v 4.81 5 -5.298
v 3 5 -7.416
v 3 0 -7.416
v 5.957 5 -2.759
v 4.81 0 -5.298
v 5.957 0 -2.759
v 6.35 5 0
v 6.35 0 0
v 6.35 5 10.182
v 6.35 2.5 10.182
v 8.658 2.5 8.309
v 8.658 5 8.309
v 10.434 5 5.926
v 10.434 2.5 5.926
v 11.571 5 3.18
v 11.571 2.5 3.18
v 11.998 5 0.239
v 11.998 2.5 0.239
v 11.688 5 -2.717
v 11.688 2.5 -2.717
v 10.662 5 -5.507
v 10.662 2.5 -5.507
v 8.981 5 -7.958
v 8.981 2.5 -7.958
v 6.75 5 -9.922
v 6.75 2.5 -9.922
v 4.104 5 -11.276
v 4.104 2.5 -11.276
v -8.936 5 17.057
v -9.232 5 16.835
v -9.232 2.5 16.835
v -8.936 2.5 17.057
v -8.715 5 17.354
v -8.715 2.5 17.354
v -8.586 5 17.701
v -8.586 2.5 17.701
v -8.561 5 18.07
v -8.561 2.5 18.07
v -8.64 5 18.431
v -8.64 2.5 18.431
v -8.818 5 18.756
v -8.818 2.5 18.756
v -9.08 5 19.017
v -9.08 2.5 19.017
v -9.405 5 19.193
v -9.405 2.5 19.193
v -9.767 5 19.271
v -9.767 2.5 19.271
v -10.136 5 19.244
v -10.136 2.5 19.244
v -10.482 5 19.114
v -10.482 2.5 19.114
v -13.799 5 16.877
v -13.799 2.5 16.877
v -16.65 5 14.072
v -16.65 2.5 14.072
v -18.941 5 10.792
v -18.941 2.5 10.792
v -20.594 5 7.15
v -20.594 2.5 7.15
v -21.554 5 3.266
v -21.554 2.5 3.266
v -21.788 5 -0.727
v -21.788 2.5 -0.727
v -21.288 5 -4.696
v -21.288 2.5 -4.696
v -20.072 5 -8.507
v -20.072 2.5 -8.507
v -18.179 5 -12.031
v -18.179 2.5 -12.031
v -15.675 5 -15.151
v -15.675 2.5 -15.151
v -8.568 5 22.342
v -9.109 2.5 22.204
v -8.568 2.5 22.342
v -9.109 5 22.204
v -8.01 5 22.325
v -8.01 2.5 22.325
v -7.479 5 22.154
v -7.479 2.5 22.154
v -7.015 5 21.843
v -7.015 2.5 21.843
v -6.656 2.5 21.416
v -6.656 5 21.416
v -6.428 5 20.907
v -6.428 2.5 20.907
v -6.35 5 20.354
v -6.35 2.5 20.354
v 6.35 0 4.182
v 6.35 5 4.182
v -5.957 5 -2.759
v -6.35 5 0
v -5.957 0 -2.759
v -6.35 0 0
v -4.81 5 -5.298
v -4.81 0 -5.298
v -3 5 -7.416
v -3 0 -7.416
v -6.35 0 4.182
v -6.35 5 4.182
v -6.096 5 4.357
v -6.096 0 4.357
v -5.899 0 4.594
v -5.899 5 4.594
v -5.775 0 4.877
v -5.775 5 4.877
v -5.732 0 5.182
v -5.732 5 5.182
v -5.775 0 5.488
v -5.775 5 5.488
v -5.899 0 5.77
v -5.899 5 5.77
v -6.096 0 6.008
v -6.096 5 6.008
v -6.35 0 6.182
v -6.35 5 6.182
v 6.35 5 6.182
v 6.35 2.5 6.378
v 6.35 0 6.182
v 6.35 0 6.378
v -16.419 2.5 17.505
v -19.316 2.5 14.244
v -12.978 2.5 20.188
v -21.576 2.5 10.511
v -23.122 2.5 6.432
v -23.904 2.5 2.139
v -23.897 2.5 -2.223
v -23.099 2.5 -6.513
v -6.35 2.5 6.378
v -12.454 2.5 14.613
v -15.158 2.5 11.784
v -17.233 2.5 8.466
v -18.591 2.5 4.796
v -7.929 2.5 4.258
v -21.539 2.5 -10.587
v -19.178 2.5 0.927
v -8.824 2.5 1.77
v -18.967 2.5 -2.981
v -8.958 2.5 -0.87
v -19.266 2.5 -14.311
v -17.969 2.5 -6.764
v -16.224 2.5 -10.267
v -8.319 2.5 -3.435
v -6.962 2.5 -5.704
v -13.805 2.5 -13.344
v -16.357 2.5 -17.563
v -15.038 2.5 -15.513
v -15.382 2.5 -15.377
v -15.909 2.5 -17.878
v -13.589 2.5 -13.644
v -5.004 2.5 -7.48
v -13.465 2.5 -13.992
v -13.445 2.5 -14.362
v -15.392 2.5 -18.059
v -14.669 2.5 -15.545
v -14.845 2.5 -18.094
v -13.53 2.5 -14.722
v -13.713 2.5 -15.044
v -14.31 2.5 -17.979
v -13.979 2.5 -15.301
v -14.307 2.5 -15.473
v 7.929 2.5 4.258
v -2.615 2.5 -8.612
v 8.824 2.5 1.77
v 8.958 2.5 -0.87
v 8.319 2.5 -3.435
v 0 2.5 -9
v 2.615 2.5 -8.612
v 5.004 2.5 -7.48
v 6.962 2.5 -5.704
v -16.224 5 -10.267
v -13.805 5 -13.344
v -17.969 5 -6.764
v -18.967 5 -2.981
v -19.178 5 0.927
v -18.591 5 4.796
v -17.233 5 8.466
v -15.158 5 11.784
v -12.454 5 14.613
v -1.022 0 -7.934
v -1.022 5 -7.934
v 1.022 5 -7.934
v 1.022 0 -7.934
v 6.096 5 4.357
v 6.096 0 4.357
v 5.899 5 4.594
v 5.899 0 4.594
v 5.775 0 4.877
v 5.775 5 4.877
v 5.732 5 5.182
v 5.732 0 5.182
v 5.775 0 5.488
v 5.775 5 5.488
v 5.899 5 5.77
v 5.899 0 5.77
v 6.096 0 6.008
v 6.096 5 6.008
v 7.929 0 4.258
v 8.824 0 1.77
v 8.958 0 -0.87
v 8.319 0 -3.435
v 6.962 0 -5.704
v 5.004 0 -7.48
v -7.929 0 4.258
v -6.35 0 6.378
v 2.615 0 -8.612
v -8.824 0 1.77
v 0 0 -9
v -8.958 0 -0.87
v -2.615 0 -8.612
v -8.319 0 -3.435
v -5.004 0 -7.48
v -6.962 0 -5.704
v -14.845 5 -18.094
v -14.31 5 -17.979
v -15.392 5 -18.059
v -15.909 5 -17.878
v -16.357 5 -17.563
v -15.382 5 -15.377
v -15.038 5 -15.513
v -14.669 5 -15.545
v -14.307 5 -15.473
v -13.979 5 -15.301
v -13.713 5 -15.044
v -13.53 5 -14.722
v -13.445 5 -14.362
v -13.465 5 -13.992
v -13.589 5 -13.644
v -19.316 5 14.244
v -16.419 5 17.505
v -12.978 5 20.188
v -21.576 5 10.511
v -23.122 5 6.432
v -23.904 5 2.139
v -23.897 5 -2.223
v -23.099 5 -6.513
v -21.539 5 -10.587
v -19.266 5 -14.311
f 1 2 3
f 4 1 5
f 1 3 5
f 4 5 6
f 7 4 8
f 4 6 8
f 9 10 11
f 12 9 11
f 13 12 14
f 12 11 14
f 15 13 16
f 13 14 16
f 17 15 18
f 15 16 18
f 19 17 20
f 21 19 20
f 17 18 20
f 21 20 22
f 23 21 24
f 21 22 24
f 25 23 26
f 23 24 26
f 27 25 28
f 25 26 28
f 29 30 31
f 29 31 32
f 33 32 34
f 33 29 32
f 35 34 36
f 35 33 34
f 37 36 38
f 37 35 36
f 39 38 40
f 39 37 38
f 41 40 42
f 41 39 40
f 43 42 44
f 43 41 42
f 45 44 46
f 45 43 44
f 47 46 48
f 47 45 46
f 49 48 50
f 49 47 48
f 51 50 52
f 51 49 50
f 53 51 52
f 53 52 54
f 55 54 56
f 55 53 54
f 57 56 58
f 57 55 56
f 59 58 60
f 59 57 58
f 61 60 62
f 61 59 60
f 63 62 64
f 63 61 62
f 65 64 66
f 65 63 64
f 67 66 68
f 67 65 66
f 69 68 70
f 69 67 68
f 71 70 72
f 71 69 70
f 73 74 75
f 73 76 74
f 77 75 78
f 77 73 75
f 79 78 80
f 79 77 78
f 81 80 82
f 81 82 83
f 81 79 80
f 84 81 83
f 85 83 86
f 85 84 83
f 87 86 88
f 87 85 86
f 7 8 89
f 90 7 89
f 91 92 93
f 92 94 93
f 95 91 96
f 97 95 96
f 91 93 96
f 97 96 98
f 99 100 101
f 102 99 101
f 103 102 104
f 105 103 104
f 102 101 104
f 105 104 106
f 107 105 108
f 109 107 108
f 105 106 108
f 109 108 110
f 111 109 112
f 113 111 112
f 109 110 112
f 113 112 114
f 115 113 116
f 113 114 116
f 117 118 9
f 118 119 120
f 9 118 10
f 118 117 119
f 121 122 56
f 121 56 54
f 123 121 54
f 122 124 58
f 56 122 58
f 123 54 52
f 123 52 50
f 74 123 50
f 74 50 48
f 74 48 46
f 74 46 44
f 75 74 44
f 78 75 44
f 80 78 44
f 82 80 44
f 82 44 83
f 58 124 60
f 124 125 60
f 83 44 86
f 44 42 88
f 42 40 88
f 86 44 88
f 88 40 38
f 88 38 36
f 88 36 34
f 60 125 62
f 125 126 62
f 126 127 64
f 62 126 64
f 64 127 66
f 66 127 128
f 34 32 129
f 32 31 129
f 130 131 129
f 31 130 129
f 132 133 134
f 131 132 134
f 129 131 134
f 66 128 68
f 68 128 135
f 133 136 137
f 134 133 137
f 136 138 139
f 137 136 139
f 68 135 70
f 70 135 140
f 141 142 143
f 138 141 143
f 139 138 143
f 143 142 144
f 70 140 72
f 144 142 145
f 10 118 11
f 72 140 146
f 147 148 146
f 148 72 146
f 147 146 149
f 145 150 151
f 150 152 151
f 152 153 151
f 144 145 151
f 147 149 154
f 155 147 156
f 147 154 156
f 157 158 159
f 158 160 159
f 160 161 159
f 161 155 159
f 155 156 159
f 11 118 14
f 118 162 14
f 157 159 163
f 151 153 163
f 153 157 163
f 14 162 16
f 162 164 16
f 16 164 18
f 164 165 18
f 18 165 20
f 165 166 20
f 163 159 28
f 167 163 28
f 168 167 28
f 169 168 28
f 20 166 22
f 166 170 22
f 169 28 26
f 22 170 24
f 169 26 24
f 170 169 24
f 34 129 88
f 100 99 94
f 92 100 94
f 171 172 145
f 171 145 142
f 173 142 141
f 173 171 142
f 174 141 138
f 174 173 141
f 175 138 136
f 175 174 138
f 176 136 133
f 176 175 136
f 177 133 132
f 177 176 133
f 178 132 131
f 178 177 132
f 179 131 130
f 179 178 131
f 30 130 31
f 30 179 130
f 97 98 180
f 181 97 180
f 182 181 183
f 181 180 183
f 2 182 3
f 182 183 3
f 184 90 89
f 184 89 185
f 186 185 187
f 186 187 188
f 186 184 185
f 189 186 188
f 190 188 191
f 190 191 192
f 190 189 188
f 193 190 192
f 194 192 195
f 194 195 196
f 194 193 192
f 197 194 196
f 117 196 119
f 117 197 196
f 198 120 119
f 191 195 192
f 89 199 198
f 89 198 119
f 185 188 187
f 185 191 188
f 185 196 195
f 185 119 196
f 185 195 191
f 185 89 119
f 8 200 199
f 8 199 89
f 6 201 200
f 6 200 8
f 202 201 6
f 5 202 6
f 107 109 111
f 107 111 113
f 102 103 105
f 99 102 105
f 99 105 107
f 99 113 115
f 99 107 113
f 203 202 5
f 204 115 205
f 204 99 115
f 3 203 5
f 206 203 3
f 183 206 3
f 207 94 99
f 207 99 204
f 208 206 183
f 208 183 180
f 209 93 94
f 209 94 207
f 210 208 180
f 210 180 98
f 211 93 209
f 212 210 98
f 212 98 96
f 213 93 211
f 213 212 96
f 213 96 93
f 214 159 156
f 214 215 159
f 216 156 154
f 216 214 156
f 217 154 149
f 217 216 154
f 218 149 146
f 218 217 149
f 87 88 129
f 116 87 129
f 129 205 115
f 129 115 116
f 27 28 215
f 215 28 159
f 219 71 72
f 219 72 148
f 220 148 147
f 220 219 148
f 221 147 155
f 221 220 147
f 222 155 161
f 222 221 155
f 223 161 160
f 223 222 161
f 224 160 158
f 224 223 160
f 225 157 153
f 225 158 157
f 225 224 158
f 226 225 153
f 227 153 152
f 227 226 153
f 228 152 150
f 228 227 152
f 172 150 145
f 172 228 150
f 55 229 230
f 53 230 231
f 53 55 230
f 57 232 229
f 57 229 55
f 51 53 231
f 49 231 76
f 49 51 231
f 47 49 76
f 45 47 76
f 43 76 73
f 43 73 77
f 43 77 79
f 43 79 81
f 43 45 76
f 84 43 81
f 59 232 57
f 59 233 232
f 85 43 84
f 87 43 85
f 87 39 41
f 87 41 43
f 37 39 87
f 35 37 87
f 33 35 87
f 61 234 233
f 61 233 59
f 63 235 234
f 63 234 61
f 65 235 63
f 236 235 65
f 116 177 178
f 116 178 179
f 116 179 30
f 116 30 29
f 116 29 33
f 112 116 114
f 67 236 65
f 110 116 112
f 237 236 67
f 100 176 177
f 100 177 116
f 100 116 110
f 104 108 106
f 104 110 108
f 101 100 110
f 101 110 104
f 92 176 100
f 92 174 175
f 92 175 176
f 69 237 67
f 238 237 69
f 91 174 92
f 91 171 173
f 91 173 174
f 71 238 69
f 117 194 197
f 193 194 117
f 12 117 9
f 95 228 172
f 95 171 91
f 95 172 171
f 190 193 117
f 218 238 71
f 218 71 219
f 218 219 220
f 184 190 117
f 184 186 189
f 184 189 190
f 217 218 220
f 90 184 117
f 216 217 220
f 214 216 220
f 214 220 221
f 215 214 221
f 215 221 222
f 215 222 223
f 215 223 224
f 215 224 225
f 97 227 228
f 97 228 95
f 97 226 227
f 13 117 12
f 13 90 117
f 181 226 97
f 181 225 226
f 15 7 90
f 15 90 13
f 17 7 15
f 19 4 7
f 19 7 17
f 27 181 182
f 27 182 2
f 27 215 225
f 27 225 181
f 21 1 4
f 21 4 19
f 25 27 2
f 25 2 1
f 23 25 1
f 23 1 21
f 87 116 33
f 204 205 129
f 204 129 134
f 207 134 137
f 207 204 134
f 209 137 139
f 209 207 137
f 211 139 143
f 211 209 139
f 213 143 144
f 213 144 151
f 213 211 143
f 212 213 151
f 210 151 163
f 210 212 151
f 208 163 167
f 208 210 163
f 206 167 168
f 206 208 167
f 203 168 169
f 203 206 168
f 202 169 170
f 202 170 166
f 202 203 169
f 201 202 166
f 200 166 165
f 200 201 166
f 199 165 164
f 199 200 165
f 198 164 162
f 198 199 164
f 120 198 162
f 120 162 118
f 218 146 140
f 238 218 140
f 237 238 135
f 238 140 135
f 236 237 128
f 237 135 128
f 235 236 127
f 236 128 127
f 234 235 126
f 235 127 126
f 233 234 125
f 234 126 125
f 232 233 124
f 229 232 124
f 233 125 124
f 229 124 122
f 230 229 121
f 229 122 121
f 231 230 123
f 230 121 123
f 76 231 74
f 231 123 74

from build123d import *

# Parameters (mm, degrees)
BOSS_EXTRUDE1_DEPTH = 2.5
BOSS_EXTRUDE2_DEPTH = 2.5
FILLET1_R           = 2
CUT_EXTRUDE1_DEPTH  = 34.176689588
BOSS_EXTRUDE3_DEPTH = 5


with BuildPart() as part:
    # Sketch1 → Boss-Extrude1 (new body)
    with BuildSketch(Plane(origin=(0, 0, 0), x_dir=(1, 0, 0), z_dir=(0, 1, 0))):
        with BuildLine():
            Line((-6.35, 0), (-6.35, -6.377891501))
            ThreePointArc((-6.35, -6.377891501), (0, 9), (6.35, -6.377891501))
            Line((6.35, -6.377891501), (6.35, 0))
            ThreePointArc((6.35, 0), (5.473649667, 4.068860406), (3, 7.416198487))
            ThreePointArc((3, 7.416198487), (0, 8), (-3, 7.416198487))
            ThreePointArc((-3, 7.416198487), (-5.473649667, 4.068860406), (-6.35, 0))
        make_face()
    extrude(amount=BOSS_EXTRUDE1_DEPTH)



with BuildPart() as body_2:
    # Sketch2 → Boss-Extrude2 (new body)
    with BuildSketch(Plane(origin=(0, 2.5, 0), x_dir=(1, 0, 0), z_dir=(0, 1, 0))):
        with BuildLine():
            Line((4.10424172, 11.276311449), (-15.426902632, 18.385066635))
            ThreePointArc((-15.426902632, 18.385066635), (-23.446511758, -5.124557191), (-6.35, -23.144707818))
            Line((-6.35, -23.144707818), (-6.35, -6.377891501))
            Line((-6.35, -6.377891501), (-6.35, 0))
            ThreePointArc((-6.35, 0), (-5.473649667, 4.068860406), (-3, 7.416198487))
            ThreePointArc((-3, 7.416198487), (0, 8), (3, 7.416198487))
            ThreePointArc((3, 7.416198487), (5.473649667, 4.068860406), (6.35, 0))
            Line((6.35, 0), (6.35, -10.182214887))
            ThreePointArc((6.35, -10.182214887), (11.934817997, 1.249047391), (4.10424172, 11.276311449))
        make_face()
    extrude(amount=BOSS_EXTRUDE2_DEPTH)

    # Fillet1
    fillet1_edges = [body_2.edges().sort_by_distance(p)[0] for p in [
        (-6.35, 3.75, 23.144707818),
        (-15.426902632, 3.75, -18.385066635),
    ]]
    fillet(fillet1_edges, radius=FILLET1_R)

    # Sketch3 → Cut-Extrude1 (cut, through all)
    with BuildSketch(Plane(origin=(0, 5, 0), x_dir=(1, 0, 0), z_dir=(0, 1, 0))):
        with BuildLine():
            ThreePointArc((-9.23213936, -16.834714219), (-8.717381687, -18.59965743), (-10.482324898, -19.114415103))
            ThreePointArc((-10.482324898, -19.114415103), (-21.553925967, -3.266232604), (-15.674771193, 15.150628635))
            ThreePointArc((-15.674771193, 15.150628635), (-13.836559277, 15.181884843), (-13.805303069, 13.343672927))
            ThreePointArc((-13.805303069, 13.343672927), (-18.983274246, -2.876681926), (-9.23213936, -16.834714219))
        make_face()
    extrude(amount=-CUT_EXTRUDE1_DEPTH, mode=Mode.SUBTRACT)


with BuildPart() as part_1:
    add(part.part)

    add(body_2.part)  # Boss-Extrude3 merges body 2
    # Sketch6 → Boss-Extrude3 (add)
    with BuildSketch(Plane(origin=(0, 5, 0), x_dir=(1, 0, 0), z_dir=(0, 1, 0))):
        with BuildLine():
            Line((6.35, -6.182214887), (6.35, -4.182214887))
            ThreePointArc((6.35, -4.182214887), (5.731966011, -5.182214887), (6.35, -6.182214887))
        make_face()
    boss_extrude3 = extrude(amount=-BOSS_EXTRUDE3_DEPTH)

    # Mirror1: Boss-Extrude3 across plane
    add(boss_extrude3.mirror(Plane(origin=(0, 0, 0), x_dir=(0, 0, 1), z_dir=(1, 0, 0))))


solid = part_1.part
